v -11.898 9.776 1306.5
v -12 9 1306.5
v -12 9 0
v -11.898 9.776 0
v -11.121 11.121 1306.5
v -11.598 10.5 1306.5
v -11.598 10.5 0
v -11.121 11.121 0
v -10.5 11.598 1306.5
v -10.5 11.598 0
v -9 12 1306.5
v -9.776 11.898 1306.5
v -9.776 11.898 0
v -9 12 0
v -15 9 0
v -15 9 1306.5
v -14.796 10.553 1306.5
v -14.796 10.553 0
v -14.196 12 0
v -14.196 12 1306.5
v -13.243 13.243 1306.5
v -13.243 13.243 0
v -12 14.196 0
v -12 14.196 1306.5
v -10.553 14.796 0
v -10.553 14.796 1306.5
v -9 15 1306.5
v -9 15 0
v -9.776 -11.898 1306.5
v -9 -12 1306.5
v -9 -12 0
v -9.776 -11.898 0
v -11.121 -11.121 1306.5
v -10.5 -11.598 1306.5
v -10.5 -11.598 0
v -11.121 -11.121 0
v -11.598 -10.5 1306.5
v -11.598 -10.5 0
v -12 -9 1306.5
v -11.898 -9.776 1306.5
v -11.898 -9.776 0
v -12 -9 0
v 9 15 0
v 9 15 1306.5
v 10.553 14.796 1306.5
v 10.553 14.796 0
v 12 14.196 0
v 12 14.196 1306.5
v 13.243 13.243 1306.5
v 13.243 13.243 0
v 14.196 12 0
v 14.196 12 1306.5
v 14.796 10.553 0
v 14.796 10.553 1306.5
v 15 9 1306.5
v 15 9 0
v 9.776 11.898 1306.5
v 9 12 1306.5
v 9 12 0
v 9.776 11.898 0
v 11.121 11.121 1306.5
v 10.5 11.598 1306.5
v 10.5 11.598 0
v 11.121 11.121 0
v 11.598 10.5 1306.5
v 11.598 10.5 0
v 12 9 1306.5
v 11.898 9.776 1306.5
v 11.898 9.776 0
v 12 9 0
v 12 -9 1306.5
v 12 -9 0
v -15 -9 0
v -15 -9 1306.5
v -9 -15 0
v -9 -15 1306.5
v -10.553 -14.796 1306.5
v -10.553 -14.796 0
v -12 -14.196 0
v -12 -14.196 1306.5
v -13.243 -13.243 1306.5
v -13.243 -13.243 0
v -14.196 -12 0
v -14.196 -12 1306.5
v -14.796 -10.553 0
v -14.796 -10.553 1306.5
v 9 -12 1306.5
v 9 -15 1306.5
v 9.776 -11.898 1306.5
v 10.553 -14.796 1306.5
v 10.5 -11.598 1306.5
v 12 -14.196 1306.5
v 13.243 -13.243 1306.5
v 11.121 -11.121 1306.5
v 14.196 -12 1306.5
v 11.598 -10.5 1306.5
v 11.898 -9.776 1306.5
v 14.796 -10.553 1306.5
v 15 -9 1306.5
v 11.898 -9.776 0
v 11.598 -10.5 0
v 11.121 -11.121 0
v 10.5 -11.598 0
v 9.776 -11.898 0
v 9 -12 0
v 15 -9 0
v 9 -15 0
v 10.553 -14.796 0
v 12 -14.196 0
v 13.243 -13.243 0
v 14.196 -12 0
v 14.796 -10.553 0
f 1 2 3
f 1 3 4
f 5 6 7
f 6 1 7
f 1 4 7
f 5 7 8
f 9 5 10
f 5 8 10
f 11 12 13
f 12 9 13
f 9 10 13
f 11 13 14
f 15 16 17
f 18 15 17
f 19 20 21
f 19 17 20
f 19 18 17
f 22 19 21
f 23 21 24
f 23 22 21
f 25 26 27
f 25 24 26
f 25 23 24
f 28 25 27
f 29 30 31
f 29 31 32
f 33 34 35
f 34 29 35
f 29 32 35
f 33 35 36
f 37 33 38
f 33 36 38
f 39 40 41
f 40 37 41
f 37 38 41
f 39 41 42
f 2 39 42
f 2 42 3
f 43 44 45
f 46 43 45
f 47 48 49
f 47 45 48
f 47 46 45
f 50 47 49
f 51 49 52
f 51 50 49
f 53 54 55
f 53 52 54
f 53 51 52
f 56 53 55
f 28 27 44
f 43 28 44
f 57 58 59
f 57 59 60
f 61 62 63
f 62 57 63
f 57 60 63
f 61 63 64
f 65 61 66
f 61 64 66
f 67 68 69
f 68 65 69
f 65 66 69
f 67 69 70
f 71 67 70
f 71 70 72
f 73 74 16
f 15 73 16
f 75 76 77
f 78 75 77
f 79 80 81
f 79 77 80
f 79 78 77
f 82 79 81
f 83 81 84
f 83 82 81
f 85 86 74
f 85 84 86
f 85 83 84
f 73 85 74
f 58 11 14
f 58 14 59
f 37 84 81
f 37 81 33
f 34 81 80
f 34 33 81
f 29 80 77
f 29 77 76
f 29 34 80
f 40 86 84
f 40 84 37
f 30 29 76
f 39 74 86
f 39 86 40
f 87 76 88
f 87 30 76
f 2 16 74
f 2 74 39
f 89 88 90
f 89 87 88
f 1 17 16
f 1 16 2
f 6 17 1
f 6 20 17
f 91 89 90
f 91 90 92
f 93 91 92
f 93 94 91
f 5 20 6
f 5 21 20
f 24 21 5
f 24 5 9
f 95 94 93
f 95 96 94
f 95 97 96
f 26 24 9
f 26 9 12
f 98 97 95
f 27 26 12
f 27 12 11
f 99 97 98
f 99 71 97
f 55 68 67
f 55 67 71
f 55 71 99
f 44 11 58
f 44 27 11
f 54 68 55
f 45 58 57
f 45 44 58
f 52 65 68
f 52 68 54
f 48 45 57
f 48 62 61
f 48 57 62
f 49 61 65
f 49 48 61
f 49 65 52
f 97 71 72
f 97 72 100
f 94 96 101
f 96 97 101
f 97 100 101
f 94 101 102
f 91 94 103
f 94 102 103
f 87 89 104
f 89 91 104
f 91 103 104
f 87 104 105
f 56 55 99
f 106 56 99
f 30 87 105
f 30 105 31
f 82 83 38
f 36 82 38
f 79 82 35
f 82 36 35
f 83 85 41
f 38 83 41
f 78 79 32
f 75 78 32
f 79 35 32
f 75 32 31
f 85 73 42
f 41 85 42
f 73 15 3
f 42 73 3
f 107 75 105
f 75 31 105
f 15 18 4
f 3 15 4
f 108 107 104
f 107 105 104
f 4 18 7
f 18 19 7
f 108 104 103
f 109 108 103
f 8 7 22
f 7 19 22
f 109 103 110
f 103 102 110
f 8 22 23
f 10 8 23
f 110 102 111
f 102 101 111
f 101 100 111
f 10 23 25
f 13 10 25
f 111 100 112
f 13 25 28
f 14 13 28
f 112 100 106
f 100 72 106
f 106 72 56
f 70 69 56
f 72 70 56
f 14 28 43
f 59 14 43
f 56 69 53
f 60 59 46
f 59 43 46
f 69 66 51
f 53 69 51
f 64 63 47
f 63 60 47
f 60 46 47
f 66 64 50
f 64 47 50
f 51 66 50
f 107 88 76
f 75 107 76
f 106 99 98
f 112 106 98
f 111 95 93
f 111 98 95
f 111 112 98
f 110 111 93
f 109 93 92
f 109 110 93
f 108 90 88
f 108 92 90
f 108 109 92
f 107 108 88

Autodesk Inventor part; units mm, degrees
ref_plane "Start Plane" through (0, 0, 0) normal (0, 0, 1) x (1, 0, 0)
ref_plane "End Plane" through (0, 0, 1306.5) normal (0, 0, 1) x (1, 0, 0)
sketch "Sketch" plane through (0, 0, 0) normal (0, 0, 1) x (1, 0, 0)
  line L0 (-15, -9) -> (-15, 9)
  line L1 (-9, 15) -> (9, 15)
  line L2 (15, 9) -> (15, -9)
  line L3 (9, -15) -> (-9, -15)
  arc A0 (-15, -9) -> (-9, -15) centre (-9, -9) ccw
  arc A1 (-9, 15) -> (-15, 9) centre (-9, 9) ccw
  arc A2 (15, 9) -> (9, 15) centre (9, 9) ccw
  arc A3 (9, -15) -> (15, -9) centre (9, -9) ccw
  arc A4 (-9, 12) -> (-12, 9) centre (-9, 9) ccw
  line L4 (-9, 12) -> (9, 12)
  arc A5 (12, 9) -> (9, 12) centre (9, 9) ccw
  line L5 (12, 9) -> (12, -9)
  arc A6 (9, -12) -> (12, -9) centre (9, -9) ccw
  line L6 (9, -12) -> (-9, -12)
  arc A7 (-12, -9) -> (-9, -12) centre (-9, -9) ccw
  line L7 (-12, -9) -> (-12, 9)
  line L8 (0, 22.7397) -> (0, -22.7397) construction
  line L9 (-22.7397, 0) -> (22.7397, 0) construction
  dimension "d7" = 6
  dimension "d10" = 30
  dimension "d11" = 30
  dimension "d12" = 3
  dimension "d15" = 15
  dimension "d16" = 15
extrude "Body" add sketch "Sketch" along normal up to surface (1306.5 mm away) from surface at 0
sketch "Sketch3" plane through (0, 0, 0) normal (0, 0, 1) x (1, 0, 0)
  line L0 (0, 0) -> (10, 0)
ref_plane "Work Plane3" through (0, 0, 0) normal (0, -1, 0) x (1, 0, 0)
ref_plane "Work Plane5" through (-200, 9, 1306.5) normal (0, 0, 1) x (1, 0, 0)
split "Split2" plane through (-200, 9, 1306.5) removes the side toward (0, 0, 1)
sketch "Sketch4" plane through (0, 0, 0) normal (0, -1, 0) x (1, 0, 0)
  line L0 (-2, 0) -> (12, 0) projected
  line L1 (-2, 1306.5) -> (12, 1306.5) projected
  dimension "d18" = 1306.5
equation "\"d7\" = G_IR"
equation "\"d10\" = G_H"
equation "\"d11\" = G_W"
equation "\"d12\" = G_T"
equation "\"d15\" = 0.5 * d10"
equation "\"d16\" = 0.5 * d11"
equation "\"d3\" = G_L"
equation "\"G_W\" = 30"
equation "\"G_H\" = 30"
equation "\"G_T\" = 3"
equation "\"G_IR\" = 6"
equation "\"G_L\" = d18"
equation "\"G_OFFSET_START\" = 0"
equation "\"G_OFFSET_END\" = -15"
equation "\"d14\" = G_OFFSET_END + B_L"
equation "\"B_L\" = 1321.5"
properties part number "DIN EN 10219-2 - 30 x 30 x 3  - 1306.5" material "Steel, Mild"
